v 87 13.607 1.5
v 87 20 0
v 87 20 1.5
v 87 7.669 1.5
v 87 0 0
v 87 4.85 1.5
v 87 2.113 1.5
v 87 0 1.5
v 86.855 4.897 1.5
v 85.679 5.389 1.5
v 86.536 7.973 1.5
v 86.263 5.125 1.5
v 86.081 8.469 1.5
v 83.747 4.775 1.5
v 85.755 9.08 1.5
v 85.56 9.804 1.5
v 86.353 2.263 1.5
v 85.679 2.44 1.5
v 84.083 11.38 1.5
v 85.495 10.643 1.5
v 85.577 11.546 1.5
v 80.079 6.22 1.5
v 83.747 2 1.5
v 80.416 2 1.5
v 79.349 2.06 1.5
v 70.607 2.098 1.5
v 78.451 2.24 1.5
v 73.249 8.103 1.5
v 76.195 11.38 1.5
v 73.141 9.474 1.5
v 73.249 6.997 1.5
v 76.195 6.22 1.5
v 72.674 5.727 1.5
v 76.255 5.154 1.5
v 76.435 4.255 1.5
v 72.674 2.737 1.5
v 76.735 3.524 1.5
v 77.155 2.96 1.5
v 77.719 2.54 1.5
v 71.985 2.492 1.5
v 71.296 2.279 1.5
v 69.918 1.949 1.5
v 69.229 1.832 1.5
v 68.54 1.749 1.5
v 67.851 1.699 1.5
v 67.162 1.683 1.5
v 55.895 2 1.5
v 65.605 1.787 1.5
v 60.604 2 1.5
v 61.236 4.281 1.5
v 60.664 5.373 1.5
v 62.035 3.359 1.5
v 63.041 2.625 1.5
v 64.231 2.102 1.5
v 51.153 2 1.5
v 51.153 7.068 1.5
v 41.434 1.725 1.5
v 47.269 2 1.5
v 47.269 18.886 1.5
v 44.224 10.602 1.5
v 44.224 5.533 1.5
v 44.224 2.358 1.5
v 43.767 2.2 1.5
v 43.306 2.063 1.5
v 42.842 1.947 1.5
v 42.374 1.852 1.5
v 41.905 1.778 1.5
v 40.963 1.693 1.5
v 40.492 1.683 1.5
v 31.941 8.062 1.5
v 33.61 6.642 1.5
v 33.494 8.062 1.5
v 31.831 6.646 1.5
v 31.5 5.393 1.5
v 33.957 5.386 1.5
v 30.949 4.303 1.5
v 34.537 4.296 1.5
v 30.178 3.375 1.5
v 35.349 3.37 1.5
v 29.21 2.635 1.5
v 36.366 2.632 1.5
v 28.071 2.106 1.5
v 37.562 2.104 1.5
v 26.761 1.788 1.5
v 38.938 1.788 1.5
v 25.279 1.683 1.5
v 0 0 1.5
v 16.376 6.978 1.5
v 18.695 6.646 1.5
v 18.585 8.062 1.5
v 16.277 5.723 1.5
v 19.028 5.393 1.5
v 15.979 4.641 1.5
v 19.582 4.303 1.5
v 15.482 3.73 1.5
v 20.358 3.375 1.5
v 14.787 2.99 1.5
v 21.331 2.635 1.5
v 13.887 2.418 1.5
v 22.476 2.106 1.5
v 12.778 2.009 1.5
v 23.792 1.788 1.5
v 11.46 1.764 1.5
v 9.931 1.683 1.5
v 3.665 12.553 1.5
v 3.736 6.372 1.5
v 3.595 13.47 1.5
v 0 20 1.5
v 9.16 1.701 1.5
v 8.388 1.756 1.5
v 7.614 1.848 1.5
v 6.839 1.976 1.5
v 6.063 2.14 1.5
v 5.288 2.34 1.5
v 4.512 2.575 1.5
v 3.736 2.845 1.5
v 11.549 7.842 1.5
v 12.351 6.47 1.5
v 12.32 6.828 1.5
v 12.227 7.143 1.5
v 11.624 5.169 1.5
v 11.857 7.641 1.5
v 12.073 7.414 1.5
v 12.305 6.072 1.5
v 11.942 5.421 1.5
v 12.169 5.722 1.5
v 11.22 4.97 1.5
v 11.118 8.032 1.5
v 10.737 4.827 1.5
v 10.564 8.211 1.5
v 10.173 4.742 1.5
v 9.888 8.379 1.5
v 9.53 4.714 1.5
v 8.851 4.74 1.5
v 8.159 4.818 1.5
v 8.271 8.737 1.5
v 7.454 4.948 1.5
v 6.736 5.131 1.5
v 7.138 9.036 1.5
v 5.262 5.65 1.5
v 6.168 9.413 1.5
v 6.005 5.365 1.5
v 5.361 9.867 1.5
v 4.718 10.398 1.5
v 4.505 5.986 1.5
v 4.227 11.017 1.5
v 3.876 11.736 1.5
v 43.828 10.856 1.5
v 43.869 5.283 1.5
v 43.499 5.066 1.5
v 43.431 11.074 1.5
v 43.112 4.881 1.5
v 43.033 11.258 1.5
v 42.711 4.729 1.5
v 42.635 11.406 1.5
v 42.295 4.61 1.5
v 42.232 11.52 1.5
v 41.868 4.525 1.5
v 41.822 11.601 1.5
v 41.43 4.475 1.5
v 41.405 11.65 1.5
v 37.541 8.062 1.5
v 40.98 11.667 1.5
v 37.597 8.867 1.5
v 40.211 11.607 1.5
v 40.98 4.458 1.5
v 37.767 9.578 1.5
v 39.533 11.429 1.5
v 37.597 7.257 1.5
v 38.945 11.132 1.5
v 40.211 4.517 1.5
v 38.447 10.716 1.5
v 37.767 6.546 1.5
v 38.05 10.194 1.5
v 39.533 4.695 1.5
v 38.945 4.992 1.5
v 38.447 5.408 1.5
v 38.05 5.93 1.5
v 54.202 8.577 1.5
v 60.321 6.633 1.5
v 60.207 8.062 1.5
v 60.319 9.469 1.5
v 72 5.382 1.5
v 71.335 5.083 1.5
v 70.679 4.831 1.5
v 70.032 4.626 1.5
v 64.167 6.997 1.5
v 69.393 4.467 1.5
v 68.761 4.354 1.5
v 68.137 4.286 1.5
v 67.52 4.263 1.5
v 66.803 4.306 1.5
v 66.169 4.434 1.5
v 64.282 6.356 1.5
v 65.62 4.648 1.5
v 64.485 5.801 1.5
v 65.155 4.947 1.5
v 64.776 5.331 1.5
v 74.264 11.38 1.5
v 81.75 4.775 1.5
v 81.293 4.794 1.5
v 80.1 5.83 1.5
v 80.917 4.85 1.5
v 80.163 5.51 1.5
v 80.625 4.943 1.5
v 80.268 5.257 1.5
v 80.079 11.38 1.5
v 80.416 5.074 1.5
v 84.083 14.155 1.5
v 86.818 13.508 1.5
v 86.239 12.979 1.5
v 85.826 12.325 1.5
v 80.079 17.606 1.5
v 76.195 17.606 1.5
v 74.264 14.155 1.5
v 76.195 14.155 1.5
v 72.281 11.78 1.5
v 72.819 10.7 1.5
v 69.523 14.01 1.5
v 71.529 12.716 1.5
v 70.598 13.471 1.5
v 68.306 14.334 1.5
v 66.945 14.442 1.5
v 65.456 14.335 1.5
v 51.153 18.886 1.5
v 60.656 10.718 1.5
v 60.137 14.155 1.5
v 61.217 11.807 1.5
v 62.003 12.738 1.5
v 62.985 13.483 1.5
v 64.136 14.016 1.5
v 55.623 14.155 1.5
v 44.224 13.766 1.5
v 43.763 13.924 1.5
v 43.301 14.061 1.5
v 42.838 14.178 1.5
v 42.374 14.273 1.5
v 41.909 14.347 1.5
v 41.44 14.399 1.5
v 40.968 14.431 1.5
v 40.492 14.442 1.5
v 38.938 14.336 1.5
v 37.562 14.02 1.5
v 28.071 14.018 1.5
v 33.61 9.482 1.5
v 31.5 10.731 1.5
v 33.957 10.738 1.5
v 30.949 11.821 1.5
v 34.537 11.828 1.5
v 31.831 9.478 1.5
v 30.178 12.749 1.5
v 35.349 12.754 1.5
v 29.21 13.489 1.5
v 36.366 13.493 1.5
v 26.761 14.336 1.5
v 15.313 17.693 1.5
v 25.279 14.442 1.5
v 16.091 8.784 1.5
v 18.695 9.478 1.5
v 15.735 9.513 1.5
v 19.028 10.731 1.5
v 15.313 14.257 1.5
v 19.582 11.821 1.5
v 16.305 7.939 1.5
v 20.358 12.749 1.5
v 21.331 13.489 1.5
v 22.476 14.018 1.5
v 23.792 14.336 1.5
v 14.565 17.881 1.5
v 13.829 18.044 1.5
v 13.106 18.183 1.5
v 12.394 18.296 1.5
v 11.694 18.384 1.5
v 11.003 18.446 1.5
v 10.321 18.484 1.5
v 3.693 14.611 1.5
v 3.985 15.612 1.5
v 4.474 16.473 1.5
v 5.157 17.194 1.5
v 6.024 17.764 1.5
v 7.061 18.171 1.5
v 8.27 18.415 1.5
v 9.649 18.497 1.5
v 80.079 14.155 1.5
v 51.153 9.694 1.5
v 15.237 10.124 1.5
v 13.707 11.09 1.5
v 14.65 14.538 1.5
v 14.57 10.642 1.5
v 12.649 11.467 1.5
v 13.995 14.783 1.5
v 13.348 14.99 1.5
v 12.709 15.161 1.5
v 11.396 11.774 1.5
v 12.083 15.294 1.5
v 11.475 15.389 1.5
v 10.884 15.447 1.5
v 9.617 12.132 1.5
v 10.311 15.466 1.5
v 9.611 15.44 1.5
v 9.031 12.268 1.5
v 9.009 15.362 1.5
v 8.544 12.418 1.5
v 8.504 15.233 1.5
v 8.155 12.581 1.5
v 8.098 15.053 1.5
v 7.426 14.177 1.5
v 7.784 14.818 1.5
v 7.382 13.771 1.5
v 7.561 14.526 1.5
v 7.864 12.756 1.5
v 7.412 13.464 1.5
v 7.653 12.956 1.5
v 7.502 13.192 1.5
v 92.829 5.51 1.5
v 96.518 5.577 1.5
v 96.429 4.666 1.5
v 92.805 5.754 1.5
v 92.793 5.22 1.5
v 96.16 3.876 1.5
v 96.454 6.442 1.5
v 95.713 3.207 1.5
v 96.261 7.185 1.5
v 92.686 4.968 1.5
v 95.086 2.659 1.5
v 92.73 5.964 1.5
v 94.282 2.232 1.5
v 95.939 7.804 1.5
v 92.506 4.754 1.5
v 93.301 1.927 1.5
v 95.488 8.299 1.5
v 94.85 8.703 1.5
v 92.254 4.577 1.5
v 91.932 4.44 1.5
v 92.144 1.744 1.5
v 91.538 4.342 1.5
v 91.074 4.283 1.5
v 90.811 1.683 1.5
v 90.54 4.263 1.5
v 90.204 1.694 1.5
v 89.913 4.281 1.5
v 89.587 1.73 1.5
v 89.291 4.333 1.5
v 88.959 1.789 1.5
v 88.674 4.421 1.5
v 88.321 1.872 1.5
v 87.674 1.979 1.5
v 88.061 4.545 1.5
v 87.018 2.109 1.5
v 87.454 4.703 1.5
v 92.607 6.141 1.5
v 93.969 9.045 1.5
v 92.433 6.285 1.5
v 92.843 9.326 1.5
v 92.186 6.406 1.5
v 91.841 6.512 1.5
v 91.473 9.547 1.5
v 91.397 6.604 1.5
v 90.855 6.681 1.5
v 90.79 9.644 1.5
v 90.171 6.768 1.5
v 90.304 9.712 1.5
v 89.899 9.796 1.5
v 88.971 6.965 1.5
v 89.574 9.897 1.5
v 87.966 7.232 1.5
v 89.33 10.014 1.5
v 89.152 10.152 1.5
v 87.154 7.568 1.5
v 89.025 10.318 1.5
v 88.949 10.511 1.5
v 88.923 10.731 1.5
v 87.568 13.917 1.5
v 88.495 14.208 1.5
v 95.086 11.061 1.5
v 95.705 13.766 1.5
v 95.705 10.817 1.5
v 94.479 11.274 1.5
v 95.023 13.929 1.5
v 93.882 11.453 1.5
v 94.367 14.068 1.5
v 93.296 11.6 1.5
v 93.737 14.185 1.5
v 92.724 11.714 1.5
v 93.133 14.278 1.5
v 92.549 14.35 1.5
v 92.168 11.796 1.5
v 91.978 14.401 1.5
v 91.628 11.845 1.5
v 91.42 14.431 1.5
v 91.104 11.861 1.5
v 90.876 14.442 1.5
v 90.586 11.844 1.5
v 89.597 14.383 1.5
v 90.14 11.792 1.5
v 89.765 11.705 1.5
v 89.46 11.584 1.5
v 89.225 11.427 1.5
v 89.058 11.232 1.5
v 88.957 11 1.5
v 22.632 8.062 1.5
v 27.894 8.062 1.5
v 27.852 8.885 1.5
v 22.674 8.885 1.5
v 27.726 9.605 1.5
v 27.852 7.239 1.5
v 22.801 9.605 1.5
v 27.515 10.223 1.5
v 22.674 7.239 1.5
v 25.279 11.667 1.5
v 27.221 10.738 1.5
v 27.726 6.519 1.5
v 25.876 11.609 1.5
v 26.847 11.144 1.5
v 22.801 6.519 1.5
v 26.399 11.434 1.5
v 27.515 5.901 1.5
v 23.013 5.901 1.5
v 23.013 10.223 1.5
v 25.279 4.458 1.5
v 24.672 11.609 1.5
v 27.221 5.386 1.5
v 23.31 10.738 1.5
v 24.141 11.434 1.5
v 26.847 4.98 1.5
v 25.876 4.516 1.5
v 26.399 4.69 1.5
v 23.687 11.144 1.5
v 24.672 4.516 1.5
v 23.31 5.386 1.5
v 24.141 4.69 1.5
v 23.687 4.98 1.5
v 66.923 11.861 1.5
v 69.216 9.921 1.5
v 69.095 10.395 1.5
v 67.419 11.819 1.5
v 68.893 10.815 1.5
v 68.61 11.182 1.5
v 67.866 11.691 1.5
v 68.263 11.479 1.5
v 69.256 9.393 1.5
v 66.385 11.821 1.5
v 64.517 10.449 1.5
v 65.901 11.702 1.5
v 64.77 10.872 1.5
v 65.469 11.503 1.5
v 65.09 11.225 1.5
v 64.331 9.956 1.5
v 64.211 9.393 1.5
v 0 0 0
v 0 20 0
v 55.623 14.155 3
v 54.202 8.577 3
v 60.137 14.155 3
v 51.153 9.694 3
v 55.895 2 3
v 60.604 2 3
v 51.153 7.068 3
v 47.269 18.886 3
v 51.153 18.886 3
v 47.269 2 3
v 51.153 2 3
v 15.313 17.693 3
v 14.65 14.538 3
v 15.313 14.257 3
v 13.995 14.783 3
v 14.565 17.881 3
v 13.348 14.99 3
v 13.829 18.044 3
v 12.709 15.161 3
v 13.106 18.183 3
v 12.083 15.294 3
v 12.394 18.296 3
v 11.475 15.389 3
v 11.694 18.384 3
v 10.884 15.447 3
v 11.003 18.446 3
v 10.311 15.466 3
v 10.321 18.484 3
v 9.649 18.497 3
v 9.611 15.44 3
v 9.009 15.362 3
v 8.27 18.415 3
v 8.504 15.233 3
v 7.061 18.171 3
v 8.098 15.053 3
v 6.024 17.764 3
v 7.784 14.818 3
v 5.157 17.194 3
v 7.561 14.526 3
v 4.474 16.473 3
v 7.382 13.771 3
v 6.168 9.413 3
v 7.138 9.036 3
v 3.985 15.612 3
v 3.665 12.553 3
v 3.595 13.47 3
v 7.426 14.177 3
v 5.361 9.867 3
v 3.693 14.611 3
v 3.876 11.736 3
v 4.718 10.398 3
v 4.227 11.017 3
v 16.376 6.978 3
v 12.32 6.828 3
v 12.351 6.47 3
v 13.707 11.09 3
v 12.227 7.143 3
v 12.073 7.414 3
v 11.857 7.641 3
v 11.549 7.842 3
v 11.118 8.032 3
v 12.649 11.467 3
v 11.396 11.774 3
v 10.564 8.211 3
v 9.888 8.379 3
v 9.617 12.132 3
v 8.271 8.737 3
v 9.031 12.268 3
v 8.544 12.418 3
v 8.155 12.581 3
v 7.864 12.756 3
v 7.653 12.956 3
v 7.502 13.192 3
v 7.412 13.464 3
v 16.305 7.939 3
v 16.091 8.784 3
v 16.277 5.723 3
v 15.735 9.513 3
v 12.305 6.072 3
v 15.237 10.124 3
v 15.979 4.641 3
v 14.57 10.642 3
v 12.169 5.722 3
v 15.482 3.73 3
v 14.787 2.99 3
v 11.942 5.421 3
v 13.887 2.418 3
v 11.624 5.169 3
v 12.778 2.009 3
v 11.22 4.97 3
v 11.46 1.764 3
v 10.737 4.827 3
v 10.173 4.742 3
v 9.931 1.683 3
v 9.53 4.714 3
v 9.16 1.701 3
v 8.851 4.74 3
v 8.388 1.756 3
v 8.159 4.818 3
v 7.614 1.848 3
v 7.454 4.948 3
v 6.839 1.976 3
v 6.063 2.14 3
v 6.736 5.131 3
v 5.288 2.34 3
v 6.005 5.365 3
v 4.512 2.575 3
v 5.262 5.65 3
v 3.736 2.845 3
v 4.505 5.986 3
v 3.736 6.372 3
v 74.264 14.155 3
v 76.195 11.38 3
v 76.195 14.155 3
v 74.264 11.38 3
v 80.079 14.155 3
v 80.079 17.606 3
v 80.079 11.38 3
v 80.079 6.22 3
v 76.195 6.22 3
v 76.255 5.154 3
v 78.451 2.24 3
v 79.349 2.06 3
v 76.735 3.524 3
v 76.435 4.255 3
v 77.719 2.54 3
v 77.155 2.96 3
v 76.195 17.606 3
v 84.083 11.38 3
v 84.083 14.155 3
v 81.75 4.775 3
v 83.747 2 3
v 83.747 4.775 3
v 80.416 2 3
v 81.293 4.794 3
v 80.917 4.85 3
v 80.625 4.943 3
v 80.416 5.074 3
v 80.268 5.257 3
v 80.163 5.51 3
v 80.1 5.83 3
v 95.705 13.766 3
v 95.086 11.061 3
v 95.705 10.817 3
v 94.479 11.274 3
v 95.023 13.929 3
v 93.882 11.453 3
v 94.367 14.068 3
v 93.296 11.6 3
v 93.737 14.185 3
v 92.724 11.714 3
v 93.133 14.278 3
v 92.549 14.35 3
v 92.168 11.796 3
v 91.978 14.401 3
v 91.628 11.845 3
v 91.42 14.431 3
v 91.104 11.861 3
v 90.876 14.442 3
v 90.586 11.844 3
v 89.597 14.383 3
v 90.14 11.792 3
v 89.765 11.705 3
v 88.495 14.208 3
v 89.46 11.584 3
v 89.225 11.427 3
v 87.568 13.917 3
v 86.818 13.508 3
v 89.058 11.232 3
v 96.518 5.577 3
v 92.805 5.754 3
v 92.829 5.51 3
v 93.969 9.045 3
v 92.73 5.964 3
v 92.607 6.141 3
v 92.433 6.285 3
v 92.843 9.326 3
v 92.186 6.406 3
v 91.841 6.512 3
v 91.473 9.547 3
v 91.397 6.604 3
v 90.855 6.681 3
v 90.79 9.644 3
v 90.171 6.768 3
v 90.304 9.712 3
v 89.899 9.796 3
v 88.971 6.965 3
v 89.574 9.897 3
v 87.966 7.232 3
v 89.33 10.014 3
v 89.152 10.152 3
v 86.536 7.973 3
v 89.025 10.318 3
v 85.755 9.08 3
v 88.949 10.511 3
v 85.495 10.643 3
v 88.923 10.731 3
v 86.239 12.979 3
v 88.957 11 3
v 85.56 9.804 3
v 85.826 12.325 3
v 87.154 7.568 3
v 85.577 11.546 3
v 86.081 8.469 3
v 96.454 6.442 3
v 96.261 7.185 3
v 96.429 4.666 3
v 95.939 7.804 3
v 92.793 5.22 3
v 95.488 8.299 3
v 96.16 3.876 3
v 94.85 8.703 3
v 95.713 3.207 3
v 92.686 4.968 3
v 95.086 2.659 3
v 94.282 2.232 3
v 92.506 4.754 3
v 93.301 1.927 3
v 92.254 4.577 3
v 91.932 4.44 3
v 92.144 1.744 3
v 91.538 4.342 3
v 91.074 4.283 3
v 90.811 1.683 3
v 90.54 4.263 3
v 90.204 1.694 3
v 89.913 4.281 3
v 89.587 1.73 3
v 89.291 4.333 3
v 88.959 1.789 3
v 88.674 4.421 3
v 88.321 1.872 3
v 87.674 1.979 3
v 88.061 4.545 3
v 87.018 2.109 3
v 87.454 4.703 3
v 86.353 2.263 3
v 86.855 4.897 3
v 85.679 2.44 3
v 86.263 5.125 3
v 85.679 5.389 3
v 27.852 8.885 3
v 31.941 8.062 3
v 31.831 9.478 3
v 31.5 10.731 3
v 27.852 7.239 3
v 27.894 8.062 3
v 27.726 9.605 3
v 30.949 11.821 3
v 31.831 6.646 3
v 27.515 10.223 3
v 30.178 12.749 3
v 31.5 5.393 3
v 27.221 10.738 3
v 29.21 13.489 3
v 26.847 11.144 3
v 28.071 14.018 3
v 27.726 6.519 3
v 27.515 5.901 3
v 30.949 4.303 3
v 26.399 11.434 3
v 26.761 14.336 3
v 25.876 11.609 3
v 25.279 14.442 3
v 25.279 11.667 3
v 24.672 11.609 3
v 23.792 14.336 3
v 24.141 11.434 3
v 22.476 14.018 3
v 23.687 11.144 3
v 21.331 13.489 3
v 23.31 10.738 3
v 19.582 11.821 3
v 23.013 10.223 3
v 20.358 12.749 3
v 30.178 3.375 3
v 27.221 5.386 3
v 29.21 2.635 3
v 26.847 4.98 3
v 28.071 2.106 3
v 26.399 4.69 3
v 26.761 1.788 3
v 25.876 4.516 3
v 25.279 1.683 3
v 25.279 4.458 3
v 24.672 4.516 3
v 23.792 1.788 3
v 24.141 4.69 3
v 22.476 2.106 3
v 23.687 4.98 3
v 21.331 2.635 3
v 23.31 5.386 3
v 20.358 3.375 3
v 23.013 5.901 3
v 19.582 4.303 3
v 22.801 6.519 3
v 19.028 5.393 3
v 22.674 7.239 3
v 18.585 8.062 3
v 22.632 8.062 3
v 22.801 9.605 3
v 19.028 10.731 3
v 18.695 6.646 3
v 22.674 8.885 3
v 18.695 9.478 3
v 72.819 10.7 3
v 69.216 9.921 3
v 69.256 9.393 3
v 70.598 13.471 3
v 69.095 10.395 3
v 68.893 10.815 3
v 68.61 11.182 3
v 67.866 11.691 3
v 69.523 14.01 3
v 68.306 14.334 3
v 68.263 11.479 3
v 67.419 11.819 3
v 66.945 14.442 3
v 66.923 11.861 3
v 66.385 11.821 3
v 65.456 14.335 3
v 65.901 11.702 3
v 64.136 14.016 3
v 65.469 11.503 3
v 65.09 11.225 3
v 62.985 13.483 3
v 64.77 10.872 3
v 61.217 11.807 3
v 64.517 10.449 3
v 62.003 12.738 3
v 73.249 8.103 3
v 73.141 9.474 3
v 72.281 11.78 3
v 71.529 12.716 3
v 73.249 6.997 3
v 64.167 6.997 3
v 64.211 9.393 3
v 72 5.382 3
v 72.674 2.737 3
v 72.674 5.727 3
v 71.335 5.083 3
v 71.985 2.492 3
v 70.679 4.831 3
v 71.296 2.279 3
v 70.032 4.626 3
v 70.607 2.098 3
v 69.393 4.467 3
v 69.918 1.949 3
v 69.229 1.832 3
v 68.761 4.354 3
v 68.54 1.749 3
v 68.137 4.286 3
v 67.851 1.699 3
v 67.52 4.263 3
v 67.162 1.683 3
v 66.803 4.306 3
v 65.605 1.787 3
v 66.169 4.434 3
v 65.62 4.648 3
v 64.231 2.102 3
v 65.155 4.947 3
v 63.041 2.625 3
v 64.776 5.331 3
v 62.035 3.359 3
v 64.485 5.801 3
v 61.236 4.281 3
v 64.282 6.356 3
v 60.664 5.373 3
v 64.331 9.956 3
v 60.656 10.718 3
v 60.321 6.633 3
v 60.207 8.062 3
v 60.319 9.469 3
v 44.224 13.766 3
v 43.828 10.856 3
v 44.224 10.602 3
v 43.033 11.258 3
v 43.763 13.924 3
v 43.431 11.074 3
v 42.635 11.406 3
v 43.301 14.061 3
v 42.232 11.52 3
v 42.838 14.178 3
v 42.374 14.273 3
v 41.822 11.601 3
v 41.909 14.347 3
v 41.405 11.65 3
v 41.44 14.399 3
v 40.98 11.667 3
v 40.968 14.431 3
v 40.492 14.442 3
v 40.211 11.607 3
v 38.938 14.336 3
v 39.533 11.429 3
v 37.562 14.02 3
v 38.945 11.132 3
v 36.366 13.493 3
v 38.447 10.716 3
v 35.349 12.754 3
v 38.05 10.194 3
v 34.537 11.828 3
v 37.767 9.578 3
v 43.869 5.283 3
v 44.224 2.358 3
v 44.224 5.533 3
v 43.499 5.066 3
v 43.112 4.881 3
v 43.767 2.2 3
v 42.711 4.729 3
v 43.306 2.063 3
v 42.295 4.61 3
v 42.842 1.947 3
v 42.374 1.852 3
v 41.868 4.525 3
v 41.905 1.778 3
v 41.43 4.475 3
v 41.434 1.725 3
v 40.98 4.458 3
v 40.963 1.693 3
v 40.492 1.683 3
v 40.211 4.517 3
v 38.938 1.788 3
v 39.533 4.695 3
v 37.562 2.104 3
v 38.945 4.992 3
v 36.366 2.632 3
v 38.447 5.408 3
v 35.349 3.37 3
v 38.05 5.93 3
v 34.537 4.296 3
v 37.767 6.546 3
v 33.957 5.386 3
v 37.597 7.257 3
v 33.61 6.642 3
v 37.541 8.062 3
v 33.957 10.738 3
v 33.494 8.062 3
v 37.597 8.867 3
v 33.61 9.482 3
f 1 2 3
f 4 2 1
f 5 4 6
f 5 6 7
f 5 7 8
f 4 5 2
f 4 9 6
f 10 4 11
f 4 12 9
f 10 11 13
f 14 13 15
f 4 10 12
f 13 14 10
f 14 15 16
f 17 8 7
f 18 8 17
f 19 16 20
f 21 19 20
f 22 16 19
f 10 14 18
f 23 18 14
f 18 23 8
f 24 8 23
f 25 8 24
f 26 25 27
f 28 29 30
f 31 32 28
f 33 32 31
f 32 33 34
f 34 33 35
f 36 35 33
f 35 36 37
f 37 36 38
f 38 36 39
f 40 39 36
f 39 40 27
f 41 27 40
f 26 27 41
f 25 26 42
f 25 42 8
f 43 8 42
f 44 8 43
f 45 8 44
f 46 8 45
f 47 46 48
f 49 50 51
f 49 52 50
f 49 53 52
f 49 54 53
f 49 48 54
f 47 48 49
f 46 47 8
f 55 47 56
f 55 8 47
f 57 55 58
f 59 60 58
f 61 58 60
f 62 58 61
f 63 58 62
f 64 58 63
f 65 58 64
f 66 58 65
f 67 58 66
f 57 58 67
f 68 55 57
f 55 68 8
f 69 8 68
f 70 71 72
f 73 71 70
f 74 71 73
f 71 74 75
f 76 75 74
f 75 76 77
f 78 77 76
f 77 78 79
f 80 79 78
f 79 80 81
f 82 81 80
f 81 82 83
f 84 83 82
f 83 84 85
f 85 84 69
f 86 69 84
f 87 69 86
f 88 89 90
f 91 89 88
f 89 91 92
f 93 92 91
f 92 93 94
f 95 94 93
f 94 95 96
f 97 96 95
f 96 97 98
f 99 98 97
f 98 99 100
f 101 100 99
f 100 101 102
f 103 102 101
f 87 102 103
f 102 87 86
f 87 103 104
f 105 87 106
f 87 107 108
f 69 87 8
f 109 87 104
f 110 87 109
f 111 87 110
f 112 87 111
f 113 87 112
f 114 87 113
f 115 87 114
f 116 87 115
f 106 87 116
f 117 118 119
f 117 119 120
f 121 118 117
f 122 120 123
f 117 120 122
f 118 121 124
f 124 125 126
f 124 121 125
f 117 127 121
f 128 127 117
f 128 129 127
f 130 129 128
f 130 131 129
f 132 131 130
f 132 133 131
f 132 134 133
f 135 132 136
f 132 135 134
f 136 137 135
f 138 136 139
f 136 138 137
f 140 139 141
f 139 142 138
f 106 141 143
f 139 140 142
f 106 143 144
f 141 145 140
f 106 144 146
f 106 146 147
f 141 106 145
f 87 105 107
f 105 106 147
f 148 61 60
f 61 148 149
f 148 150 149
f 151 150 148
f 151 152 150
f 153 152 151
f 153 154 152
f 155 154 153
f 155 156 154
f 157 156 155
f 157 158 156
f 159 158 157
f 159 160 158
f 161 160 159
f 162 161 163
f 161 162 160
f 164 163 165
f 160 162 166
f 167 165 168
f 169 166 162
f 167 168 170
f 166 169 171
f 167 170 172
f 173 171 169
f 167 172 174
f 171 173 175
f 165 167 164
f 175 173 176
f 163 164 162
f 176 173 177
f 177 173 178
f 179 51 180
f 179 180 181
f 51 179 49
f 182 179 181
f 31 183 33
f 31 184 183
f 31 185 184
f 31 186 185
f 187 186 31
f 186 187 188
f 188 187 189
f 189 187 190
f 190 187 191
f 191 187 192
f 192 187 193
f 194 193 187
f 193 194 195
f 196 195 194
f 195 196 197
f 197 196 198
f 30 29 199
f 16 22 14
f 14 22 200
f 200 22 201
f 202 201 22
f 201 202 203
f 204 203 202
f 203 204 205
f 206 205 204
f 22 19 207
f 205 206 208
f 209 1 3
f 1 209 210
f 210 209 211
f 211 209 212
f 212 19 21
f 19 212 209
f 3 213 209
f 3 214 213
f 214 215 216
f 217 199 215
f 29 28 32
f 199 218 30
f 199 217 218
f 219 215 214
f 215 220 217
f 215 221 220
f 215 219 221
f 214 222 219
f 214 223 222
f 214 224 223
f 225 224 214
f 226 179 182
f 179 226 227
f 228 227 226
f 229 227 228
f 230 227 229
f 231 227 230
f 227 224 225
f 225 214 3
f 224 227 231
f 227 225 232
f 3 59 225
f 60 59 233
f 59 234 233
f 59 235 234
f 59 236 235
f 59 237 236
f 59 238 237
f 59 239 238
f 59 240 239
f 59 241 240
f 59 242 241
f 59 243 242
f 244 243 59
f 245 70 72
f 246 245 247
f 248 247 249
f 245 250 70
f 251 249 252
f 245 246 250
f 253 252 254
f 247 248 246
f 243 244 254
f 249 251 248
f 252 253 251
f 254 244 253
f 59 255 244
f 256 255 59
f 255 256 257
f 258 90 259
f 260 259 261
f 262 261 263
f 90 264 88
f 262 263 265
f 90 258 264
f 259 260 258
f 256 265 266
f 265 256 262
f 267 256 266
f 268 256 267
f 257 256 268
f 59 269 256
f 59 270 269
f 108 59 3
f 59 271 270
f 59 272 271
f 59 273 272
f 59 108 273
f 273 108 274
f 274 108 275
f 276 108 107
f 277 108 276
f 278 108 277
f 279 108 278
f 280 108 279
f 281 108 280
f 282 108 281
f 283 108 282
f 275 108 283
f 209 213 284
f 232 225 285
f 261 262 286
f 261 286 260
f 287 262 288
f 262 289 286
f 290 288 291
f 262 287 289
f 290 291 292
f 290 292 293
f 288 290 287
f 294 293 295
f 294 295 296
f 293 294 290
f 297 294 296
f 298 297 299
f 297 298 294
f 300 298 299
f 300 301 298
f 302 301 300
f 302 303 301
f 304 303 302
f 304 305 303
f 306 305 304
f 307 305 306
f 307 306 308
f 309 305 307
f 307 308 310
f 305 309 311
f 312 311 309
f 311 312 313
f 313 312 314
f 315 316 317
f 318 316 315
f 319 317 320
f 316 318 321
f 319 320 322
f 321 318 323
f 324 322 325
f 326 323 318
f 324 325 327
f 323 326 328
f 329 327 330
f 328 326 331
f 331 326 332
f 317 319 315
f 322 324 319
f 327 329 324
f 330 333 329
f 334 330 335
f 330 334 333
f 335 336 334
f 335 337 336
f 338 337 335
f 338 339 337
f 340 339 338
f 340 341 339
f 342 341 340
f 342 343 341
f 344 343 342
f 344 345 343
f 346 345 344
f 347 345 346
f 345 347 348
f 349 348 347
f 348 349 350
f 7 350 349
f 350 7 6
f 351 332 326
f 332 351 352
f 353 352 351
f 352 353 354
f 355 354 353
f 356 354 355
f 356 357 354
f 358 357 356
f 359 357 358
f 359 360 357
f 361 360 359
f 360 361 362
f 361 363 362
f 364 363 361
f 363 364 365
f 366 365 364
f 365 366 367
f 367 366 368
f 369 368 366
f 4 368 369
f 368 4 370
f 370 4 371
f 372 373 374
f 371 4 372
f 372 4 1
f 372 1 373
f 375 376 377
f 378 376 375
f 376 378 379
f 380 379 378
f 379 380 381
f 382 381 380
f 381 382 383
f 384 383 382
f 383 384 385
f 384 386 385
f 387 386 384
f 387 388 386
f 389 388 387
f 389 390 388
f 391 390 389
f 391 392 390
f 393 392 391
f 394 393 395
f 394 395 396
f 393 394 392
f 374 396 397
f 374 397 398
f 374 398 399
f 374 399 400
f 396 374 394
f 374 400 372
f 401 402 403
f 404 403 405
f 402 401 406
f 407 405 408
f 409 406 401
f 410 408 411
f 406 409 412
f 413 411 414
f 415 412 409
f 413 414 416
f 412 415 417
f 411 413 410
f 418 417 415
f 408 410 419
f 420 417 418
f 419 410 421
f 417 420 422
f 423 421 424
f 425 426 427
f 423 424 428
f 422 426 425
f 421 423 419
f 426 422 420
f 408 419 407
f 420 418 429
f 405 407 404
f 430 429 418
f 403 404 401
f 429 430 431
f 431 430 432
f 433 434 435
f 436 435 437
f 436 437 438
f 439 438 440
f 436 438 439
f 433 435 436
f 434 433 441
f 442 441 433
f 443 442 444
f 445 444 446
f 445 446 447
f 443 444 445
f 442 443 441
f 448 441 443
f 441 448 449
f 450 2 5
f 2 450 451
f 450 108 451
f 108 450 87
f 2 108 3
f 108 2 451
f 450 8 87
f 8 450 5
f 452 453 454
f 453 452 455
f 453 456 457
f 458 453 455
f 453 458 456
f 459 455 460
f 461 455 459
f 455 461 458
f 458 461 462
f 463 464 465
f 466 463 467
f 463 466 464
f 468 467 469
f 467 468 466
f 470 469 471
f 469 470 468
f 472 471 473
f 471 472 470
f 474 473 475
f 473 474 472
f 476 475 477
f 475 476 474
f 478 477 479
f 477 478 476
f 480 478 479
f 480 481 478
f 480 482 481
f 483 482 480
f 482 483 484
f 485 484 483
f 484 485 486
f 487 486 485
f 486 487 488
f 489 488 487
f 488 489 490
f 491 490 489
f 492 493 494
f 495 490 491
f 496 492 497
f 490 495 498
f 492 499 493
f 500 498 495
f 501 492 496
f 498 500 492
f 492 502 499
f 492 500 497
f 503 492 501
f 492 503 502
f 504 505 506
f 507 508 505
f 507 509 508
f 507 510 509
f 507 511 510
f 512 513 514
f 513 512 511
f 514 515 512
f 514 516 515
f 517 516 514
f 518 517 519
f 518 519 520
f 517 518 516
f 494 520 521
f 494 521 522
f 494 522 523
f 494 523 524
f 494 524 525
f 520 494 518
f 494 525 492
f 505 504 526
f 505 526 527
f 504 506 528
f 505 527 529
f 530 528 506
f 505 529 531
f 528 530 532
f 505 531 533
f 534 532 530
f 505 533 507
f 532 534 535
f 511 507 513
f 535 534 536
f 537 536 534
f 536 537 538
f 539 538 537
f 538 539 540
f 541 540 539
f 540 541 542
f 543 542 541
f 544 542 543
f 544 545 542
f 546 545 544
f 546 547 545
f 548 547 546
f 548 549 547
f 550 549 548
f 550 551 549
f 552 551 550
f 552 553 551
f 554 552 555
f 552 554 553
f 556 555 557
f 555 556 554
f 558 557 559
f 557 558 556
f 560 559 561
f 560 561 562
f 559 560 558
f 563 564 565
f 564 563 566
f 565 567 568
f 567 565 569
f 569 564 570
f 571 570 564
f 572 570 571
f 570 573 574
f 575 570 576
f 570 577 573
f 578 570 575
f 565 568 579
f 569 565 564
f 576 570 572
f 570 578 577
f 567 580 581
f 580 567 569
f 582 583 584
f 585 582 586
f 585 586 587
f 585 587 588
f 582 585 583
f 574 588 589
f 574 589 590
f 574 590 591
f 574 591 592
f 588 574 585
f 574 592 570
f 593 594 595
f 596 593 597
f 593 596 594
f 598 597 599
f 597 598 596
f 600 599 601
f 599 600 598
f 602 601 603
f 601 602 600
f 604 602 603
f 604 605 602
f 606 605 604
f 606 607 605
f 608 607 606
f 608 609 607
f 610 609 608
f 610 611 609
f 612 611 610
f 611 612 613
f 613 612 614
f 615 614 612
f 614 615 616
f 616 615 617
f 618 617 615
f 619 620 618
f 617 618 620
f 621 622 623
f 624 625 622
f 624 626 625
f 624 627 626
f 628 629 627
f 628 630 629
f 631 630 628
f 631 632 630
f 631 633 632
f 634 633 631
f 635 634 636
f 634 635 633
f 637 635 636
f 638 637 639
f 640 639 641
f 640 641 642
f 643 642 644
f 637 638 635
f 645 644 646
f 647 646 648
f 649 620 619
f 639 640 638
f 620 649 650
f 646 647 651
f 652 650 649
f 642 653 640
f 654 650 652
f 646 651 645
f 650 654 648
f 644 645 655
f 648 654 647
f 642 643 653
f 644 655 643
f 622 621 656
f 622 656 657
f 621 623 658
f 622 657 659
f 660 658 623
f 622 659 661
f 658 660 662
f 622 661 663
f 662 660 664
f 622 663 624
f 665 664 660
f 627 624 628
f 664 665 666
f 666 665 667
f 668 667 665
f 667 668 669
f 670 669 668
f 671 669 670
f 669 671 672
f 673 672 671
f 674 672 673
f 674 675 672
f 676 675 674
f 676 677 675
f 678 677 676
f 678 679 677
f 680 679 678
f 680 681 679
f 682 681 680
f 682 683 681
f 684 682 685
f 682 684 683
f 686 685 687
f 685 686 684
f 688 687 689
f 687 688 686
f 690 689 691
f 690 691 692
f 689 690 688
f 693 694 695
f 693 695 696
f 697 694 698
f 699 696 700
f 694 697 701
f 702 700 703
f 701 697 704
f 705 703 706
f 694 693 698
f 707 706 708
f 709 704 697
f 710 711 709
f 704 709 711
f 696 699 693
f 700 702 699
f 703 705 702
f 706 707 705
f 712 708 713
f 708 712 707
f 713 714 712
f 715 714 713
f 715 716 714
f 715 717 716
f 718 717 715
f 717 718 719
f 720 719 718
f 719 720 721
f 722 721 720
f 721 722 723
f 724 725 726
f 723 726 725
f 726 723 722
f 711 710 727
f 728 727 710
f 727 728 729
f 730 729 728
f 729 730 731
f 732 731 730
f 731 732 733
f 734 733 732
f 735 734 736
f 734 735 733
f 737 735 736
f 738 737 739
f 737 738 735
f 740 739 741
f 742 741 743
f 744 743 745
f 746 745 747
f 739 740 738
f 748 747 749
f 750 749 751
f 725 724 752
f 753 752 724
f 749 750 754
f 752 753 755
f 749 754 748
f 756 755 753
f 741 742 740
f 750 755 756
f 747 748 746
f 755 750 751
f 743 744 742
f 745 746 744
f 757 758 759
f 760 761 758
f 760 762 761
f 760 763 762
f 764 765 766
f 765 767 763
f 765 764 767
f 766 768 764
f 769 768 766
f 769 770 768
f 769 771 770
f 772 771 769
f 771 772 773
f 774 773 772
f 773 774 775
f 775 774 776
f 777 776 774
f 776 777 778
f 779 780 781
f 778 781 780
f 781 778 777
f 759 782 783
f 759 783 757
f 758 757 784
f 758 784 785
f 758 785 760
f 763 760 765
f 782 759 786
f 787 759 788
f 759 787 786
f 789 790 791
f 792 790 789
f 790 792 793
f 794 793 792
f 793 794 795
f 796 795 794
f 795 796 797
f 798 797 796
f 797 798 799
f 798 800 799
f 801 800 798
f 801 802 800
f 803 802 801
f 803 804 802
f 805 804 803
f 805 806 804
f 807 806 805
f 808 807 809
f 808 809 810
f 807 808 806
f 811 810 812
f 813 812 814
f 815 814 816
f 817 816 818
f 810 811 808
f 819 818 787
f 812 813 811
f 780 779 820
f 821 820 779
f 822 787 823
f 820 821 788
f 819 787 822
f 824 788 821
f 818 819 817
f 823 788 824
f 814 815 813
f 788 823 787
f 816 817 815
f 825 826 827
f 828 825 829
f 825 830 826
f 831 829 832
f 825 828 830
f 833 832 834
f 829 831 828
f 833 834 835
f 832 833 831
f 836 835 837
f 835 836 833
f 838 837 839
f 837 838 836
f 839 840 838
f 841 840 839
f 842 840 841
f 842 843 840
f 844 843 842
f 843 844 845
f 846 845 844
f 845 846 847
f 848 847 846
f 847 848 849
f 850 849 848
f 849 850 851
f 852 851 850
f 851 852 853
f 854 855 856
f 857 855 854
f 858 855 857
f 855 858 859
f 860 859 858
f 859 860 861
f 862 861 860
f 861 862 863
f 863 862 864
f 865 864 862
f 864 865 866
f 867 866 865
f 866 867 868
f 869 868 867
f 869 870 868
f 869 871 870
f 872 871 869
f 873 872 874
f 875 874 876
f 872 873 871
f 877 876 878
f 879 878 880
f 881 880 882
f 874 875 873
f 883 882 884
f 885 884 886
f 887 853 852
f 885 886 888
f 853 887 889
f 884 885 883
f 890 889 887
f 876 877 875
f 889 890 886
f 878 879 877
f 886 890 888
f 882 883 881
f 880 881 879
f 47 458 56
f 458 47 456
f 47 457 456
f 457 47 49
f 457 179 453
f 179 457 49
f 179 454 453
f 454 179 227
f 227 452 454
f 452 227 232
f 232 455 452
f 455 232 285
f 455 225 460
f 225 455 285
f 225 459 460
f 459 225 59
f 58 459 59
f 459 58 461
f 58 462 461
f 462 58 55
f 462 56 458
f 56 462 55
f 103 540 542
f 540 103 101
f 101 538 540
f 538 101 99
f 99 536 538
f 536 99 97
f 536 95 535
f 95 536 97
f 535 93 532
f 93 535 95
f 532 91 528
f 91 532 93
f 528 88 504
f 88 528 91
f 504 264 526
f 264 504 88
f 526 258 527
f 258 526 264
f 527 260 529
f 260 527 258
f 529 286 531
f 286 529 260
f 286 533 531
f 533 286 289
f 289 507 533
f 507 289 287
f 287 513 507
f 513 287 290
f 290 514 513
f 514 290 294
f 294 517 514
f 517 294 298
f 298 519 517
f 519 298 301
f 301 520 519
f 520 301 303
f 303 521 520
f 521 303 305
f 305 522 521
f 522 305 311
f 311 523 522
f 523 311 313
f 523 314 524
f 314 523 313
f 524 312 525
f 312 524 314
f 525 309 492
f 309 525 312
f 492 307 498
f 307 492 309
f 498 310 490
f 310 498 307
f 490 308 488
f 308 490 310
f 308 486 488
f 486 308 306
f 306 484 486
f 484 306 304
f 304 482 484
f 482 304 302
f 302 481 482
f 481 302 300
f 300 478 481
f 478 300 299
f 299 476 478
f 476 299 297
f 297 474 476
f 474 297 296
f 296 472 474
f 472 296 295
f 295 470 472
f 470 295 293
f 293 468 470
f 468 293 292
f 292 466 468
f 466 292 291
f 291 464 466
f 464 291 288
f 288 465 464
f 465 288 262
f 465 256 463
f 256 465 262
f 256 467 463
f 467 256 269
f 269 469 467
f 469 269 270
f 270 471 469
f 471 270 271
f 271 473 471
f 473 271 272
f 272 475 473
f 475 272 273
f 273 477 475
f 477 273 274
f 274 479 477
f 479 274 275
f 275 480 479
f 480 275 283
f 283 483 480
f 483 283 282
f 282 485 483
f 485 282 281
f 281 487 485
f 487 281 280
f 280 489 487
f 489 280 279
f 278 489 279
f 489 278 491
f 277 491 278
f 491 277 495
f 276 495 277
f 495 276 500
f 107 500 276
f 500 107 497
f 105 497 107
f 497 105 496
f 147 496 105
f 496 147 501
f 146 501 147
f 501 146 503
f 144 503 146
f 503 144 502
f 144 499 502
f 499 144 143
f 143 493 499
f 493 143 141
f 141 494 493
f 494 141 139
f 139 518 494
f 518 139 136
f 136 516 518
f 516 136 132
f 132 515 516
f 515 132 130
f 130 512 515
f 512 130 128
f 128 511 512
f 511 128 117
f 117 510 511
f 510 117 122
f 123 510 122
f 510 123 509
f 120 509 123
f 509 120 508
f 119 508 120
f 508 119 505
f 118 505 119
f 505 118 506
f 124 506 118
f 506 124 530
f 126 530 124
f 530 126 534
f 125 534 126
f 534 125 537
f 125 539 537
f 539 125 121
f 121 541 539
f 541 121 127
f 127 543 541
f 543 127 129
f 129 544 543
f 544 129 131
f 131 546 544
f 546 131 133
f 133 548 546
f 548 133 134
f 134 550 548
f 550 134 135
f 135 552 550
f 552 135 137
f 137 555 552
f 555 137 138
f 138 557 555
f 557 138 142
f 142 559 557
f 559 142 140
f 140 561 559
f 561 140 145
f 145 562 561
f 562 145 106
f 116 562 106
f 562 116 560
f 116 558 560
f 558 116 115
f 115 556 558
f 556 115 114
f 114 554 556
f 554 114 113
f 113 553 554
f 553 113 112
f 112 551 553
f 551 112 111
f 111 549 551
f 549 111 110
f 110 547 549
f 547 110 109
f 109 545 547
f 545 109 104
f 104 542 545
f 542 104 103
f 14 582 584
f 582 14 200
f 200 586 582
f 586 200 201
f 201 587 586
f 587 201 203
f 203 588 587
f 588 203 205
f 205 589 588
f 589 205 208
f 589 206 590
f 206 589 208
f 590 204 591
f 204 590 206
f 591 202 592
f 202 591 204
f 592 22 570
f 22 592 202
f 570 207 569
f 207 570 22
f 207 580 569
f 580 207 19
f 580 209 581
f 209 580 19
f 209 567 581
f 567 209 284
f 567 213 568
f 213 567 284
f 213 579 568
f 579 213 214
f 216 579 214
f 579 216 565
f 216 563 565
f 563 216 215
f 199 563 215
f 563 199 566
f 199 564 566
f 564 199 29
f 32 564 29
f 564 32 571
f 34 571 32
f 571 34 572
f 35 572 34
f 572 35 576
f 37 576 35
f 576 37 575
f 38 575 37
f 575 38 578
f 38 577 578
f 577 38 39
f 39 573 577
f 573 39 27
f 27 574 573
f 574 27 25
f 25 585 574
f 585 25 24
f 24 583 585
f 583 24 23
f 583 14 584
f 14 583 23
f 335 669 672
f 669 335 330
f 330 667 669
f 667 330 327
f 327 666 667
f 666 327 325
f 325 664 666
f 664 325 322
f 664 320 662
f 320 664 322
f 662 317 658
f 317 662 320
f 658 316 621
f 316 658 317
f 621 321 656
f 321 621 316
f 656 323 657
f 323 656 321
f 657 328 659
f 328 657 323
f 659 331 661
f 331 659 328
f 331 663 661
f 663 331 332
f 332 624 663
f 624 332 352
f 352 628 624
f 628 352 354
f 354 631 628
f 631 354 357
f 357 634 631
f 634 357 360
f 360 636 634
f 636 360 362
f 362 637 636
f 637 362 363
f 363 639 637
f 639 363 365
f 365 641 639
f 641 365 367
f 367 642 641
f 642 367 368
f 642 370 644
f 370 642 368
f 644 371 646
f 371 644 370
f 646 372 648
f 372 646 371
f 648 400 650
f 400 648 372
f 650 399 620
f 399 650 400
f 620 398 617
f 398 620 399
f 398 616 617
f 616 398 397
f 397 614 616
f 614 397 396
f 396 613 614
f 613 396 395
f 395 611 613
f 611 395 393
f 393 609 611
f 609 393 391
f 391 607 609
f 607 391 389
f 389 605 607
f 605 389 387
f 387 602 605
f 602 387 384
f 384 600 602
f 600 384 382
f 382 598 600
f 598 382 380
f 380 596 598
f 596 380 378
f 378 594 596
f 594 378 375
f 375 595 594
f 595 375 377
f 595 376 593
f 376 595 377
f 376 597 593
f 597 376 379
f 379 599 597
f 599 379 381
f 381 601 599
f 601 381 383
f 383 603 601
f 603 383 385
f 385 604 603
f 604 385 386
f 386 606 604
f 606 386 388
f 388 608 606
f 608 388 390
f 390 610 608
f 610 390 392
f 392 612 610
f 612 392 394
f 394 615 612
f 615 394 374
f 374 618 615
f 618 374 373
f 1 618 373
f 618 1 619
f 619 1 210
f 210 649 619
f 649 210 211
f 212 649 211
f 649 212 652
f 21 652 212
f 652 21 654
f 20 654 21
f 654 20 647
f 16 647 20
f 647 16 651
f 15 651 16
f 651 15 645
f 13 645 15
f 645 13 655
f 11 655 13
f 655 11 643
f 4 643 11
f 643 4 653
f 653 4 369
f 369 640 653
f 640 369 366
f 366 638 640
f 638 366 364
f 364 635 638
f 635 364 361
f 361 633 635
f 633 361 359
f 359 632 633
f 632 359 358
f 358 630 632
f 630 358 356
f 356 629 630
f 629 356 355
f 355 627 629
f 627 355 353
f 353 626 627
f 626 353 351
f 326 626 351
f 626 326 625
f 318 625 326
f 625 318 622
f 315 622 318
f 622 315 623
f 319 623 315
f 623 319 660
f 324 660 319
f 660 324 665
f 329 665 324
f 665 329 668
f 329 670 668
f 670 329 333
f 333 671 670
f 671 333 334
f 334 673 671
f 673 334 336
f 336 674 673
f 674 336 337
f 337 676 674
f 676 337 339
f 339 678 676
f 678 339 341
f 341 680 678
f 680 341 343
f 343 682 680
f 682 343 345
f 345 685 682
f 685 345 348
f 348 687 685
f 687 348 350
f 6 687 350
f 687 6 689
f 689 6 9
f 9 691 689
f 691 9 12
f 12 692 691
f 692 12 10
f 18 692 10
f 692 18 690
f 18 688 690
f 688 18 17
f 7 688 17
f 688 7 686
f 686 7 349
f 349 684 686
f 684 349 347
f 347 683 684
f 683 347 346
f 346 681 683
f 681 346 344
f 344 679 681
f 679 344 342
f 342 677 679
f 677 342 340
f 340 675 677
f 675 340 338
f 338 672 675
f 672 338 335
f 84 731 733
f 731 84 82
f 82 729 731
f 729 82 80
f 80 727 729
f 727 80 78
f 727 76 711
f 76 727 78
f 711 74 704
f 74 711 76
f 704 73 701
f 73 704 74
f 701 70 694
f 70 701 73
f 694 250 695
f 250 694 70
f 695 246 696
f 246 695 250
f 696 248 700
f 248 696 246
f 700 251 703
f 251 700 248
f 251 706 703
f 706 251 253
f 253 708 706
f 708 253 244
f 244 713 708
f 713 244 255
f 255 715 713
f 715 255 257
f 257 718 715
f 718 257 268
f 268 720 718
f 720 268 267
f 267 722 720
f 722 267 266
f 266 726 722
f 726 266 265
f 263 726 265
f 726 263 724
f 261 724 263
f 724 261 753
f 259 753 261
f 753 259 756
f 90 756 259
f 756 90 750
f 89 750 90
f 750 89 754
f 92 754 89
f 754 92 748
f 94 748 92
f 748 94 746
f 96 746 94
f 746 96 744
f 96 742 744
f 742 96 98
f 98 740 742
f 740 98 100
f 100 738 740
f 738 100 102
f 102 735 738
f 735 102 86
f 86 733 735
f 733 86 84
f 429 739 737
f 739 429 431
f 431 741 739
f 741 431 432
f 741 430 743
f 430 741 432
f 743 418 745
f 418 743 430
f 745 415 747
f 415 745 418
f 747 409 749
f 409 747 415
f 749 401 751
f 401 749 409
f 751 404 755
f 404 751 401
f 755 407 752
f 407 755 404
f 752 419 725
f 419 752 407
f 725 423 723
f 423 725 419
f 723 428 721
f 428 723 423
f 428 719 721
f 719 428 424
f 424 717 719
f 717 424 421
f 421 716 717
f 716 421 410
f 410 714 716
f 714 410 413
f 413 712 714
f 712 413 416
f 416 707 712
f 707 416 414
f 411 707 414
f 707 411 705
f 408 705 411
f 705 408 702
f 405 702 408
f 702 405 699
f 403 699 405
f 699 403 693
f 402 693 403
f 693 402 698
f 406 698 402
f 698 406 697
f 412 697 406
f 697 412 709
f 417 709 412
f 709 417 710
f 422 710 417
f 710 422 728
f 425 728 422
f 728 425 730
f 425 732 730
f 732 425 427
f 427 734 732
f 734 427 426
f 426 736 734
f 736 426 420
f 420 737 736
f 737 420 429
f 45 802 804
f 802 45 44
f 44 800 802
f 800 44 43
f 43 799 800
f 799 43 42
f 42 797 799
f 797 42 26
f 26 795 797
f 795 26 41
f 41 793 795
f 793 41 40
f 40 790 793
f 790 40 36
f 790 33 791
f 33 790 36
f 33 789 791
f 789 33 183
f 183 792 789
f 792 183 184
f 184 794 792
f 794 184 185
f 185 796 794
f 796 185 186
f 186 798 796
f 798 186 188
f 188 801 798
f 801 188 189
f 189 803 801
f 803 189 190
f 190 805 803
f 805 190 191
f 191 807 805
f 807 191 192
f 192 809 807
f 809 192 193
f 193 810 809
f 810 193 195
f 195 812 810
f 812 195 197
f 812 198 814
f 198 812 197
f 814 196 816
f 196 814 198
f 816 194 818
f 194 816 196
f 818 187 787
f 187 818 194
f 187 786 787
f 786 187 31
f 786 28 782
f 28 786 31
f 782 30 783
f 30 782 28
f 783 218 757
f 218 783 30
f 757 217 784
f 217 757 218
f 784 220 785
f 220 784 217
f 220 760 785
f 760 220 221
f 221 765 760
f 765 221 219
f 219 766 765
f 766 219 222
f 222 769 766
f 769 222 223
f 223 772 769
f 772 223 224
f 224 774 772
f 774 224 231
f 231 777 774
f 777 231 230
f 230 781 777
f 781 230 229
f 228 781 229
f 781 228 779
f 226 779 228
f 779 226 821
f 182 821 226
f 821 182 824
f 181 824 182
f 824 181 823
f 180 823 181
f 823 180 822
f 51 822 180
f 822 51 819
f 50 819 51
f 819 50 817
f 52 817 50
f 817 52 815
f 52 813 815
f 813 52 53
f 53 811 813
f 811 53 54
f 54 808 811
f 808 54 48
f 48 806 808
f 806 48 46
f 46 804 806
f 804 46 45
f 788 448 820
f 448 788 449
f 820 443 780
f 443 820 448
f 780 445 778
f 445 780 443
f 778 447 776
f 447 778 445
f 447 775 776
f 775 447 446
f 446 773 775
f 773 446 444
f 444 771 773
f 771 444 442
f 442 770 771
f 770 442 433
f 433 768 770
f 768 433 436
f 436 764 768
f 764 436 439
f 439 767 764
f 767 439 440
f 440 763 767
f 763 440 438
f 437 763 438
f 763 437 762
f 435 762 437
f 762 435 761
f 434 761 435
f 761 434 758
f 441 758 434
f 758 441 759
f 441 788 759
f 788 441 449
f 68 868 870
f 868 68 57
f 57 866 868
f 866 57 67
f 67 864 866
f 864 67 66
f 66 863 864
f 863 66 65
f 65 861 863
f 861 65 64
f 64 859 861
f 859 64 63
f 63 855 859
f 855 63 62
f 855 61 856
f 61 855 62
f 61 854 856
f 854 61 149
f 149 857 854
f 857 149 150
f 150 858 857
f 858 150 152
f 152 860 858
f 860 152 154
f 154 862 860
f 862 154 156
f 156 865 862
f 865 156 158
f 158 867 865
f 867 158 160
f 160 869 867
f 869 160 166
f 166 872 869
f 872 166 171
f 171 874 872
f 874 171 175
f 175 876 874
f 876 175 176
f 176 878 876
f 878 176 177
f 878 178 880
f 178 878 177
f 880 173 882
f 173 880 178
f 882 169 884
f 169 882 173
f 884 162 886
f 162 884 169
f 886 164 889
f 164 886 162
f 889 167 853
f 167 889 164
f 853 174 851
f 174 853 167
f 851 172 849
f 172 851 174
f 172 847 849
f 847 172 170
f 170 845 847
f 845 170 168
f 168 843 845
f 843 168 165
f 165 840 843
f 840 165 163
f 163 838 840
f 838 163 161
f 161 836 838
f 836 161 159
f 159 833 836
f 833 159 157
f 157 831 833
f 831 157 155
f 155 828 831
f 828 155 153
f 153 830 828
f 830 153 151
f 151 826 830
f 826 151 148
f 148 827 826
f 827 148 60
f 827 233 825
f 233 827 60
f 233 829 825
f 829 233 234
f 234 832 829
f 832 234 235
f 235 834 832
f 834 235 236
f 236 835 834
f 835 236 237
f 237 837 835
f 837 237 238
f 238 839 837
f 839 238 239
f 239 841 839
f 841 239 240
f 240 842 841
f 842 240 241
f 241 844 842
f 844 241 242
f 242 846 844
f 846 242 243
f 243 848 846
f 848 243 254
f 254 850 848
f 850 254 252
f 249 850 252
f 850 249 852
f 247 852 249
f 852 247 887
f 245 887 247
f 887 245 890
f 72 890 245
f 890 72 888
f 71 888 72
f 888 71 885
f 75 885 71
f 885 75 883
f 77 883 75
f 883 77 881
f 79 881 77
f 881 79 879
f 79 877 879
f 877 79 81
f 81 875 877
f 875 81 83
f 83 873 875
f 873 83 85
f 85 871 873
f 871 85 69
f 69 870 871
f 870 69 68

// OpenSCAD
// Label text
label = "Sockets";

//Label length
label_length = 87;

// Label thickness
label_thickness = 1.5;

// Text thickness
text_thickness = 1.5;

// Text size
font_size = 16;

// Label height
label_height = 20;

// Font
font = "REGISTRATION PLATE UK:style=Bold";

// Make the label
// Make the base
color("red") cube([label_length,label_height,label_thickness]);

// Create the text
color("white") translate([2,2,label_thickness])
linear_extrude(height = text_thickness) {
        text(text = str(label), font = font, size = font_size);
}
